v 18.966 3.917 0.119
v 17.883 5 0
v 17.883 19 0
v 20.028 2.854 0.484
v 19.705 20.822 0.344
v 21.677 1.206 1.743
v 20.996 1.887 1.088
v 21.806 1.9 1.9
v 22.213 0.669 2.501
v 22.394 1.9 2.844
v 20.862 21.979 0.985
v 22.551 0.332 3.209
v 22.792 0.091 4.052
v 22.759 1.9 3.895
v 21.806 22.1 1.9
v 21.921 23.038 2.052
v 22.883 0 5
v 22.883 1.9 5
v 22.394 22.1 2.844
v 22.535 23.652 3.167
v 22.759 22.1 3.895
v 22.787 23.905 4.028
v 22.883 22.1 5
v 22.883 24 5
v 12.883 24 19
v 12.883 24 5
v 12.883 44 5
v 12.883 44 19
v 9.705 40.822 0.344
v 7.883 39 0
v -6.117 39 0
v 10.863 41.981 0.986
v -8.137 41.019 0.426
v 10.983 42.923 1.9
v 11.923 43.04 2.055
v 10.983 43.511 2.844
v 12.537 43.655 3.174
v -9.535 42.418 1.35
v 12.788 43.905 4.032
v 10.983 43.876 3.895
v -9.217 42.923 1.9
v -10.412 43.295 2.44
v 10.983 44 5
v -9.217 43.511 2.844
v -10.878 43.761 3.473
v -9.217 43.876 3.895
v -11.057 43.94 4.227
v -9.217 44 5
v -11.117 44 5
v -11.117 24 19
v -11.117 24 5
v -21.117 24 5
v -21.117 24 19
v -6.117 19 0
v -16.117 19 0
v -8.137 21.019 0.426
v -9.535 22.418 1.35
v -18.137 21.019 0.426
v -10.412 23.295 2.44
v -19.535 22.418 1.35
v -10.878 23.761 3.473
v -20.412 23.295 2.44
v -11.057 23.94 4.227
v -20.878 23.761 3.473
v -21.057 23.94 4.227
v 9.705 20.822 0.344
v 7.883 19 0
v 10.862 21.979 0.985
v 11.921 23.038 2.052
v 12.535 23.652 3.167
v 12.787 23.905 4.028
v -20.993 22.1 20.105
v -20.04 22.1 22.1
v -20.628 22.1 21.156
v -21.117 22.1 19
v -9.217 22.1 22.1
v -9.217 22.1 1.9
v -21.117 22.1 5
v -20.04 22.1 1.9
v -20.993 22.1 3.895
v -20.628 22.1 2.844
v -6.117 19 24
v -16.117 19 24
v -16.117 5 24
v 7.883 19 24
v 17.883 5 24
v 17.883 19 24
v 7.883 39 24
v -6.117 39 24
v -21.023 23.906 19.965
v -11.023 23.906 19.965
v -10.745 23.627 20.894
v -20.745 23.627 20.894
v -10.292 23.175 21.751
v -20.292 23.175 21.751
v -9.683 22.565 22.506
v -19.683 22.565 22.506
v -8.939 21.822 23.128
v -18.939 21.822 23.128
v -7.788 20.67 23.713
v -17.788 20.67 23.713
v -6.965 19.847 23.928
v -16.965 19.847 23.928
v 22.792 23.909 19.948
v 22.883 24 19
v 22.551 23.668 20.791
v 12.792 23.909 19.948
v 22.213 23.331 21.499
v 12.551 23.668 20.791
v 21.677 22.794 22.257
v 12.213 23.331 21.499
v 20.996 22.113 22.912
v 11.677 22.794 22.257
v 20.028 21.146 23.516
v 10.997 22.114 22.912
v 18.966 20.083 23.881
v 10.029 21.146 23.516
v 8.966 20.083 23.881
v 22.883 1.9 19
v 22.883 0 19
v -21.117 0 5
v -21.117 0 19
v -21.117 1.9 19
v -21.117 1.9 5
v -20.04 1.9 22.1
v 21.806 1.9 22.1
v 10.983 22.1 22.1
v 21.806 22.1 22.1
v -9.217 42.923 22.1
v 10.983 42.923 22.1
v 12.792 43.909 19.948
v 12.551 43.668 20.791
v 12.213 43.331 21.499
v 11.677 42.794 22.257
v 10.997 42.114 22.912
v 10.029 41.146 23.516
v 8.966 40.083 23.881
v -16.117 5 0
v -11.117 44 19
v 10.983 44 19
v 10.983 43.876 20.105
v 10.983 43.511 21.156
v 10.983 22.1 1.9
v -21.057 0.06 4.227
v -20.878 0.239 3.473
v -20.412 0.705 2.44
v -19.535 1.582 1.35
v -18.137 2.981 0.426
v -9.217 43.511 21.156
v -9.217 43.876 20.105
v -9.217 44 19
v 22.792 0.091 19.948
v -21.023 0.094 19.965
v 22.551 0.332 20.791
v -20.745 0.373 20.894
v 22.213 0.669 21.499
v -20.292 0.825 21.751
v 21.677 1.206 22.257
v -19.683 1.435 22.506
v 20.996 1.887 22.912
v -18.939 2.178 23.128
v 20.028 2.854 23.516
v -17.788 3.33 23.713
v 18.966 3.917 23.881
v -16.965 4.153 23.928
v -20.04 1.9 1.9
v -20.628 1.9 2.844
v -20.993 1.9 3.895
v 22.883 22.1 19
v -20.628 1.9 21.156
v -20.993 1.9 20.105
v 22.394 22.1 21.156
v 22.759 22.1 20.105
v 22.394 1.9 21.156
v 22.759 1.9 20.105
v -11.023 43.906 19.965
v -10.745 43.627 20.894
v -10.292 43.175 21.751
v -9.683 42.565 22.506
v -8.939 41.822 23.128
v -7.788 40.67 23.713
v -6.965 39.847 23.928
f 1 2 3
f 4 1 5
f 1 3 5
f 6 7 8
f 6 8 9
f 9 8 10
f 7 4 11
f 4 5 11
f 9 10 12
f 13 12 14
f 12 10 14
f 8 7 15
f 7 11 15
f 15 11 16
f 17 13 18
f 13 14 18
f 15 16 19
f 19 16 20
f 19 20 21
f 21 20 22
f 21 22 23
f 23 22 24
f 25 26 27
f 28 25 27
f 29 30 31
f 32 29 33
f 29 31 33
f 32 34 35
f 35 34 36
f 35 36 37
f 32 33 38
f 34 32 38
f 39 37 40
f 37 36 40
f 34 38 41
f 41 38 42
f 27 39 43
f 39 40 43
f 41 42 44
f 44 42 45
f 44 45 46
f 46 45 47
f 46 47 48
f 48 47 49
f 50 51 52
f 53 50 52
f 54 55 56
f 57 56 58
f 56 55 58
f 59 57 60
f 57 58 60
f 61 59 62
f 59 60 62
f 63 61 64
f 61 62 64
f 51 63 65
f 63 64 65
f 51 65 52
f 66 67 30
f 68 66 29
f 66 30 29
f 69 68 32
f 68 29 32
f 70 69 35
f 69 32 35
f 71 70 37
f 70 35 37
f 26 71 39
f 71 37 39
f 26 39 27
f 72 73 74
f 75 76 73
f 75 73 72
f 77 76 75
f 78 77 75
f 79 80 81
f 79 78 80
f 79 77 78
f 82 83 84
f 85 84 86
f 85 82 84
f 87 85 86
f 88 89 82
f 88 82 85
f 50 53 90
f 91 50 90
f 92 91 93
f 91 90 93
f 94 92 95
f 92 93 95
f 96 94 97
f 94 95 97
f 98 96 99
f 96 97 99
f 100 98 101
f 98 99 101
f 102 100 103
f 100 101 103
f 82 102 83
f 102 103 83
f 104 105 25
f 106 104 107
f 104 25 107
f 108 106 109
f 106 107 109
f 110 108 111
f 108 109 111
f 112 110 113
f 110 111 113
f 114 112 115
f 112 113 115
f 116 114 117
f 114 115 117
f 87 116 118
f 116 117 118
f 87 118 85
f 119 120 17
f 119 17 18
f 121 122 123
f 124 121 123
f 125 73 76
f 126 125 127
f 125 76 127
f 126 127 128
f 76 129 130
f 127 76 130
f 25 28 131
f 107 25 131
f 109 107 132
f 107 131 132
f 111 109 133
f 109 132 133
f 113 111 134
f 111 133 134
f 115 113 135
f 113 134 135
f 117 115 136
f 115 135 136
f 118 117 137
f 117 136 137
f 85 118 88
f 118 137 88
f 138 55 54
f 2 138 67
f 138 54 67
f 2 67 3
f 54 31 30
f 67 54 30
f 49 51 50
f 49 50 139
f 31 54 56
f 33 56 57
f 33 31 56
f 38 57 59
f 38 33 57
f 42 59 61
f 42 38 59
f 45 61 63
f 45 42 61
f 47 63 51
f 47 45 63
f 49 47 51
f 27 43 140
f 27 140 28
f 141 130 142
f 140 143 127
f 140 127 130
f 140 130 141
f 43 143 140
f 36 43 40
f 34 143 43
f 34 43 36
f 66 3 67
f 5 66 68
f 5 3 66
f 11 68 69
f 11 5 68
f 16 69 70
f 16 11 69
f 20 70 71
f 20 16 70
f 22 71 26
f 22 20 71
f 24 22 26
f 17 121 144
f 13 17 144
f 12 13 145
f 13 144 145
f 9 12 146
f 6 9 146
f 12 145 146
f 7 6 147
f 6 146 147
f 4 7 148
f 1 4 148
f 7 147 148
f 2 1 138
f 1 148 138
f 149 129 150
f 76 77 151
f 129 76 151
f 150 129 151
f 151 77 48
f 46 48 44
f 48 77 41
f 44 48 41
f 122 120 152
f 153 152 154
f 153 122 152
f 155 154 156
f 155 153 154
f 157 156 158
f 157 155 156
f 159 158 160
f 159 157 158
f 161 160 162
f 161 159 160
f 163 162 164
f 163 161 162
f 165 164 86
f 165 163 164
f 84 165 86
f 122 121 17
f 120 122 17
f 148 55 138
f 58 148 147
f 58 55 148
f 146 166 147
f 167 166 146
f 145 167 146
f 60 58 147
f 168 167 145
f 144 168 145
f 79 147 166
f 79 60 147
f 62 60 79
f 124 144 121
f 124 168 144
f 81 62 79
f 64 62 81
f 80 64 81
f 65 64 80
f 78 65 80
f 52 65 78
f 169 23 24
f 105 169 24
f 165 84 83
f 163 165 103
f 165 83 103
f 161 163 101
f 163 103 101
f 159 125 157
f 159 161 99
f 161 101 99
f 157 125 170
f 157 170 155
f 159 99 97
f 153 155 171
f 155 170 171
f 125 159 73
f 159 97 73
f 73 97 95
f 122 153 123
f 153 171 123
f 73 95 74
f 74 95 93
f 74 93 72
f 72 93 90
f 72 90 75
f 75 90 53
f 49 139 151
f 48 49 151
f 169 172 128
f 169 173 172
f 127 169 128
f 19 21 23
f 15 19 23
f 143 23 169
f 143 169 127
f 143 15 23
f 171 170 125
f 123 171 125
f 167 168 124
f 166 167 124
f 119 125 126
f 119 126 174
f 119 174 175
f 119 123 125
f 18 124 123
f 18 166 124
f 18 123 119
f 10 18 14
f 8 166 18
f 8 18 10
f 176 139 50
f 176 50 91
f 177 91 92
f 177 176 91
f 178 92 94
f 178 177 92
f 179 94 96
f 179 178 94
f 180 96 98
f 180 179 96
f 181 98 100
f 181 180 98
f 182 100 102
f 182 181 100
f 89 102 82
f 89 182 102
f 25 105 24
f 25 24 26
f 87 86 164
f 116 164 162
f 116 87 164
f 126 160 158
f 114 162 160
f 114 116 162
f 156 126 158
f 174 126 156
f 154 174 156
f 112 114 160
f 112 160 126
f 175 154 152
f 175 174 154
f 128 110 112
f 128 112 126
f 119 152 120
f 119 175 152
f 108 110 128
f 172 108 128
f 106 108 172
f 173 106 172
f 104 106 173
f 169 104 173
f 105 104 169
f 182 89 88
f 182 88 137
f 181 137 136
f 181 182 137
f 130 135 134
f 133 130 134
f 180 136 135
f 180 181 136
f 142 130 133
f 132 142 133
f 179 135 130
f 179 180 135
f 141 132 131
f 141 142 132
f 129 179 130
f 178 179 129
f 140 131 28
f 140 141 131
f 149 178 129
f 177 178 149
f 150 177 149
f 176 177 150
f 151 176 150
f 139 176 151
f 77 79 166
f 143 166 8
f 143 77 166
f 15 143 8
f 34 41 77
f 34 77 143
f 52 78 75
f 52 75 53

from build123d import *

# Parameters (mm, degrees)
F0_W          = 10
F0_H          = 24
F0_W_2        = 24
F0_H_2        = 20
F1_DEPTH      = 24
F2_T          = -1.9
F3_T1_DEPTH   = 44
F3_T3_DEPTH   = 24
F3_T5_DEPTH   = 10
F3_T7_DEPTH   = 20
F3_T9_DEPTH   = 24
F3_T11_DEPTH  = 10
F3_T17_DEPTH  = 56.5
F3_T21_DEPTH  = 36.5
F3_T28_DEPTH  = 56.5
F3_T32_DEPTH  = 36.5
F3_T39_DEPTH  = 22.5
F3_T43_DEPTH  = 36.5
F3_T50_DEPTH  = 22.5
F3_T54_DEPTH  = 32.5
F3_T61_DEPTH  = 32.5
F3_T65_DEPTH  = 36.5
F3_T72_DEPTH  = 32.5
F3_T76_DEPTH  = 36.5
F3_T83_DEPTH  = 32.5
F3_T87_DEPTH  = 22.5
F3_T94_DEPTH  = 22.5
F3_T98_DEPTH  = 36.5
F3_T105_DEPTH = 56.5
F3_T109_DEPTH = 36.5
F3_T116_DEPTH = 56.5
F3_T120_DEPTH = 36.5
F3_T127_DEPTH = 36.5
F3_T131_DEPTH = 22.5
F3_T138_DEPTH = 22.5
F3_T142_DEPTH = 32.5
F3_T149_DEPTH = 32.5
F3_T153_DEPTH = 36.5
F3_T160_DEPTH = 36.5
F3_T164_DEPTH = 32.5
F3_T171_DEPTH = 32.5
F3_T175_DEPTH = 22.5
F3_T182_DEPTH = 22.5
F3_T186_DEPTH = 36.5


# Not quite as in the source:
# - a fillet or chamfer that OpenCascade refuses, or shapes differently, is made with other operations: its cross-section is extruded or revolved along the edge and cut away or added


with BuildPart() as f1:
    # F0 (on Top) → F1 (new body)
    with BuildSketch(Plane.XY):
        with Locations((-16.1171973497, 12)):
            Rectangle(F0_W, F0_H)
        with Locations((0.8828026503, 12)):
            Rectangle(F0_W_2, F0_H)
        with Locations((17.8828026503, 12)):
            Rectangle(F0_W, F0_H)
        with Locations((0.8828026503, 34)):
            Rectangle(F0_W_2, F0_H_2)
    extrude(amount=F1_DEPTH)

    # F2
    f2_openings = [f1.faces().sort_by_distance(p)[0] for p in [
        (-21.117197, 12, 12),
        (22.882803, 12, 12),
        (0.882803, 44, 12),
    ]]
    offset(amount=F2_T, openings=f2_openings, kind=Kind.INTERSECTION)

    # F3: fillet of radius 5 on 16 edges, made by hand

    # F3_s2 → F3_t1 (cut)
    with BuildSketch(Plane.YZ.offset(-21.1171973497)):
        with BuildLine():
            ThreePointArc((0, 19), (1.4644660941, 22.5355339059), (5, 24))
            Line((5, 24), (5, 24.1))
            Line((5, 24.1), (-0.1, 24.1))
            Line((-0.1, 24.1), (-0.1, 19))
            Line((-0.1, 19), (0, 19))
        make_face()
        with BuildLine():
            ThreePointArc((0, 5), (1.4644660941, 1.4644660941), (5, 0))
            Line((5, 0), (5, -0.1))
            Line((5, -0.1), (-0.1, -0.1))
            Line((-0.1, -0.1), (-0.1, 5))
            Line((-0.1, 5), (0, 5))
        make_face()
    extrude(amount=F3_T1_DEPTH, mode=Mode.SUBTRACT)

    # F3_s4 → F3_t3 (cut)
    with BuildSketch(Plane.XZ.offset(-24)):
        with BuildLine():
            ThreePointArc((17.8828026503, 24), (21.4183365563, 22.5355339059), (22.8828026503, 19))
            Line((22.8828026503, 19), (22.9828026503, 19))
            Line((22.9828026503, 19), (22.9828026503, 24.1))
            Line((22.9828026503, 24.1), (17.8828026503, 24.1))
            Line((17.8828026503, 24.1), (17.8828026503, 24))
        make_face()
        with BuildLine():
            ThreePointArc((-16.1171973497, 24), (-19.6527312556, 22.5355339059), (-21.1171973497, 19))
            Line((-21.1171973497, 19), (-21.2171973497, 19))
            Line((-21.2171973497, 19), (-21.2171973497, 24.1))
            Line((-21.2171973497, 24.1), (-16.1171973497, 24.1))
            Line((-16.1171973497, 24.1), (-16.1171973497, 24))
        make_face()
        with BuildLine():
            ThreePointArc((17.8828026503, 0), (21.4183365563, 1.4644660941), (22.8828026503, 5))
            Line((22.8828026503, 5), (22.9828026503, 5))
            Line((22.9828026503, 5), (22.9828026503, -0.1))
            Line((22.9828026503, -0.1), (17.8828026503, -0.1))
            Line((17.8828026503, -0.1), (17.8828026503, 0))
        make_face()
        with BuildLine():
            ThreePointArc((-16.1171973497, 0), (-19.6527312556, 1.4644660941), (-21.1171973497, 5))
            Line((-21.1171973497, 5), (-21.2171973497, 5))
            Line((-21.2171973497, 5), (-21.2171973497, -0.1))
            Line((-21.2171973497, -0.1), (-16.1171973497, -0.1))
            Line((-16.1171973497, -0.1), (-16.1171973497, 0))
        make_face()
    extrude(amount=F3_T3_DEPTH, mode=Mode.SUBTRACT)

    # F3_s6 → F3_t5 (cut)
    with BuildSketch(Plane.YZ.offset(12.8828026503)):
        with BuildLine():
            ThreePointArc((24, 19), (22.5355339059, 22.5355339059), (19, 24))
            Line((19, 24), (19, 24.1))
            Line((19, 24.1), (24.1, 24.1))
            Line((24.1, 24.1), (24.1, 19))
            Line((24.1, 19), (24, 19))
        make_face()
        with BuildLine():
            ThreePointArc((19, 0), (22.5355339059, 1.4644660941), (24, 5))
            Line((24, 5), (24.1, 5))
            Line((24.1, 5), (24.1, -0.1))
            Line((24.1, -0.1), (19, -0.1))
            Line((19, -0.1), (19, 0))
        make_face()
    extrude(amount=F3_T5_DEPTH, mode=Mode.SUBTRACT)

    # F3_s8 → F3_t7 (cut)
    with BuildSketch(Plane.XZ.offset(-44)):
        with BuildLine():
            ThreePointArc((12.8828026503, 19), (11.4183365563, 22.5355339059), (7.8828026503, 24))
            Line((7.8828026503, 24), (7.8828026503, 24.1))
            Line((7.8828026503, 24.1), (12.9828026503, 24.1))
            Line((12.9828026503, 24.1), (12.9828026503, 19))
            Line((12.9828026503, 19), (12.8828026503, 19))
        make_face()
        with BuildLine():
            ThreePointArc((-11.1171973497, 19), (-9.6527312556, 22.5355339059), (-6.1171973497, 24))
            Line((-6.1171973497, 24), (-6.1171973497, 24.1))
            Line((-6.1171973497, 24.1), (-11.2171973497, 24.1))
            Line((-11.2171973497, 24.1), (-11.2171973497, 19))
            Line((-11.2171973497, 19), (-11.1171973497, 19))
        make_face()
        with BuildLine():
            ThreePointArc((7.8828026503, 0), (11.4183365563, 1.4644660941), (12.8828026503, 5))
            Line((12.8828026503, 5), (12.9828026503, 5))
            Line((12.9828026503, 5), (12.9828026503, -0.1))
            Line((12.9828026503, -0.1), (7.8828026503, -0.1))
            Line((7.8828026503, -0.1), (7.8828026503, 0))
        make_face()
        with BuildLine():
            ThreePointArc((-6.1171973497, 0), (-9.6527312556, 1.4644660941), (-11.1171973497, 5))
            Line((-11.1171973497, 5), (-11.2171973497, 5))
            Line((-11.2171973497, 5), (-11.2171973497, -0.1))
            Line((-11.2171973497, -0.1), (-6.1171973497, -0.1))
            Line((-6.1171973497, -0.1), (-6.1171973497, 0))
        make_face()
    extrude(amount=F3_T7_DEPTH, mode=Mode.SUBTRACT)

    # F3_s10 → F3_t9 (cut)
    with BuildSketch(Plane.YZ.offset(-11.1171973497)):
        with BuildLine():
            ThreePointArc((39, 24), (42.5355339059, 22.5355339059), (44, 19))
            Line((44, 19), (44.1, 19))
            Line((44.1, 19), (44.1, 24.1))
            Line((44.1, 24.1), (39, 24.1))
            Line((39, 24.1), (39, 24))
        make_face()
        with BuildLine():
            ThreePointArc((39, 0), (42.5355339059, 1.4644660941), (44, 5))
            Line((44, 5), (44.1, 5))
            Line((44.1, 5), (44.1, -0.1))
            Line((44.1, -0.1), (39, -0.1))
            Line((39, -0.1), (39, 0))
        make_face()
    extrude(amount=F3_T9_DEPTH, mode=Mode.SUBTRACT)

    # F3_s12 → F3_t11 (cut)
    with BuildSketch(Plane.YZ.offset(-21.1171973497)):
        with BuildLine():
            ThreePointArc((24, 19), (22.5355339059, 22.5355339059), (19, 24))
            Line((19, 24), (19, 24.1))
            Line((19, 24.1), (24.1, 24.1))
            Line((24.1, 24.1), (24.1, 19))
            Line((24.1, 19), (24, 19))
        make_face()
        with BuildLine():
            ThreePointArc((19, 0), (22.5355339059, 1.4644660941), (24, 5))
            Line((24, 5), (24.1, 5))
            Line((24.1, 5), (24.1, -0.1))
            Line((24.1, -0.1), (19, -0.1))
            Line((19, -0.1), (19, 0))
        make_face()
    extrude(amount=F3_T11_DEPTH, mode=Mode.SUBTRACT)


with BuildPart() as f3_tool15:
    # F3_s16 → F3_t17 (new body)
    with BuildSketch(Plane.YZ.offset(-33.6171973497)):
        with BuildLine():
            ThreePointArc((0, 19), (1.4644660941, 22.5355339059), (5, 24))
            Line((5, 24), (5, 24.1))
            Line((5, 24.1), (-0.1, 24.1))
            Line((-0.1, 24.1), (-0.1, 19))
            Line((-0.1, 19), (0, 19))
        make_face()
    extrude(amount=F3_T17_DEPTH)

    split(bisect_by=Plane.YZ.offset(-21.1171973497), keep=Keep.BOTTOM)


with BuildPart() as f3_tool19:
    # F3_s20 → F3_t21 (new body)
    with BuildSketch(Plane.XZ.offset(-24)):
        with BuildLine():
            ThreePointArc((-16.1171973497, 24), (-19.6527312556, 22.5355339059), (-21.1171973497, 19))
            Line((-21.1171973497, 19), (-21.2171973497, 19))
            Line((-21.2171973497, 19), (-21.2171973497, 24.1))
            Line((-21.2171973497, 24.1), (-16.1171973497, 24.1))
            Line((-16.1171973497, 24.1), (-16.1171973497, 24))
        make_face()
    extrude(amount=F3_T21_DEPTH)

    split(bisect_by=Plane.XZ, keep=Keep.TOP)


with BuildPart() as f3_tool15_1:
    add(f3_tool15.part)

    # F3_t23: intersect F3_tool19
    add(f3_tool19.part, mode=Mode.INTERSECT)


with BuildPart() as f1_1:
    add(f1.part)

    # F3_t13: cut F3_tool15
    add(f3_tool15_1.part, mode=Mode.SUBTRACT)


with BuildPart() as f3_tool26:
    # F3_s27 → F3_t28 (new body)
    with BuildSketch(Plane.YZ.offset(-21.1171973497)):
        with BuildLine():
            ThreePointArc((0, 19), (1.4644660941, 22.5355339059), (5, 24))
            Line((5, 24), (5, 24.1))
            Line((5, 24.1), (-0.1, 24.1))
            Line((-0.1, 24.1), (-0.1, 19))
            Line((-0.1, 19), (0, 19))
        make_face()
    extrude(amount=F3_T28_DEPTH)

    split(bisect_by=Plane.YZ.offset(22.8828026503), keep=Keep.TOP)


with BuildPart() as f3_tool30:
    # F3_s31 → F3_t32 (new body)
    with BuildSketch(Plane.XZ.offset(12.5)):
        with BuildLine():
            ThreePointArc((17.8828026503, 24), (21.4183365563, 22.5355339059), (22.8828026503, 19))
            Line((22.8828026503, 19), (22.9828026503, 19))
            Line((22.9828026503, 19), (22.9828026503, 24.1))
            Line((22.9828026503, 24.1), (17.8828026503, 24.1))
            Line((17.8828026503, 24.1), (17.8828026503, 24))
        make_face()
    extrude(amount=-F3_T32_DEPTH)

    split(bisect_by=Plane.XZ, keep=Keep.TOP)


with BuildPart() as f3_tool26_1:
    add(f3_tool26.part)

    # F3_t34: intersect F3_tool30
    add(f3_tool30.part, mode=Mode.INTERSECT)


with BuildPart() as f1_2:
    add(f1_1.part)

    # F3_t24: cut F3_tool26
    add(f3_tool26_1.part, mode=Mode.SUBTRACT)


with BuildPart() as f3_tool37:
    # F3_s38 → F3_t39 (new body)
    with BuildSketch(Plane.YZ.offset(35.3828026503)):
        with BuildLine():
            ThreePointArc((24, 19), (22.5355339059, 22.5355339059), (19, 24))
            Line((19, 24), (19, 24.1))
            Line((19, 24.1), (24.1, 24.1))
            Line((24.1, 24.1), (24.1, 19))
            Line((24.1, 19), (24, 19))
        make_face()
    extrude(amount=-F3_T39_DEPTH)

    split(bisect_by=Plane.YZ.offset(22.8828026503), keep=Keep.TOP)


with BuildPart() as f3_tool41:
    # F3_s42 → F3_t43 (new body)
    with BuildSketch(Plane.XZ):
        with BuildLine():
            ThreePointArc((17.8828026503, 24), (21.4183365563, 22.5355339059), (22.8828026503, 19))
            Line((22.8828026503, 19), (22.9828026503, 19))
            Line((22.9828026503, 19), (22.9828026503, 24.1))
            Line((22.9828026503, 24.1), (17.8828026503, 24.1))
            Line((17.8828026503, 24.1), (17.8828026503, 24))
        make_face()
    extrude(amount=-F3_T43_DEPTH)

    split(bisect_by=Plane.XZ.offset(-24), keep=Keep.BOTTOM)


with BuildPart() as f3_tool37_1:
    add(f3_tool37.part)

    # F3_t45: intersect F3_tool41
    add(f3_tool41.part, mode=Mode.INTERSECT)


with BuildPart() as f1_3:
    add(f1_2.part)

    # F3_t35: cut F3_tool37
    add(f3_tool37_1.part, mode=Mode.SUBTRACT)


with BuildPart() as f3_tool48:
    # F3_s49 → F3_t50 (new body)
    with BuildSketch(Plane.YZ.offset(22.8828026503)):
        with BuildLine():
            ThreePointArc((24, 19), (22.5355339059, 22.5355339059), (19, 24))
            Line((19, 24), (19, 24.1))
            Line((19, 24.1), (24.1, 24.1))
            Line((24.1, 24.1), (24.1, 19))
            Line((24.1, 19), (24, 19))
        make_face()
    extrude(amount=-F3_T50_DEPTH)

    split(bisect_by=Plane.YZ.offset(12.8828026503), keep=Keep.BOTTOM)


with BuildPart() as f3_tool52:
    # F3_s53 → F3_t54 (new body)
    with BuildSketch(Plane.XZ.offset(-11.5)):
        with BuildLine():
            ThreePointArc((12.8828026503, 19), (11.4183365563, 22.5355339059), (7.8828026503, 24))
            Line((7.8828026503, 24), (7.8828026503, 24.1))
            Line((7.8828026503, 24.1), (12.9828026503, 24.1))
            Line((12.9828026503, 24.1), (12.9828026503, 19))
            Line((12.9828026503, 19), (12.8828026503, 19))
        make_face()
    extrude(amount=-F3_T54_DEPTH)

    split(bisect_by=Plane.XZ.offset(-24), keep=Keep.TOP)


with BuildPart() as f3_tool48_1:
    add(f3_tool48.part)

    # F3_t56: intersect F3_tool52
    add(f3_tool52.part, mode=Mode.INTERSECT)


with BuildPart() as f1_4:
    add(f1_3.part)

    # F3_t46: cut F3_tool48
    add(f3_tool48_1.part, mode=Mode.SUBTRACT)


with BuildPart() as f3_tool59:
    # F3_s60 → F3_t61 (new body)
    with BuildSketch(Plane.XZ.offset(-24)):
        with BuildLine():
            ThreePointArc((12.8828026503, 19), (11.4183365563, 22.5355339059), (7.8828026503, 24))
            Line((7.8828026503, 24), (7.8828026503, 24.1))
            Line((7.8828026503, 24.1), (12.9828026503, 24.1))
            Line((12.9828026503, 24.1), (12.9828026503, 19))
            Line((12.9828026503, 19), (12.8828026503, 19))
        make_face()
    extrude(amount=-F3_T61_DEPTH)

    split(bisect_by=Plane.XZ.offset(-44), keep=Keep.BOTTOM)


with BuildPart() as f3_tool63:
    # F3_s64 → F3_t65 (new body)
    with BuildSketch(Plane.YZ.offset(25.3828026503)):
        with BuildLine():
            ThreePointArc((39, 24), (42.5355339059, 22.5355339059), (44, 19))
            Line((44, 19), (44.1, 19))
            Line((44.1, 19), (44.1, 24.1))
            Line((44.1, 24.1), (39, 24.1))
            Line((39, 24.1), (39, 24))
        make_face()
    extrude(amount=-F3_T65_DEPTH)

    split(bisect_by=Plane.YZ.offset(12.8828026503), keep=Keep.TOP)


with BuildPart() as f3_tool59_1:
    add(f3_tool59.part)

    # F3_t67: intersect F3_tool63
    add(f3_tool63.part, mode=Mode.INTERSECT)


with BuildPart() as f1_5:
    add(f1_4.part)

    # F3_t57: cut F3_tool59
    add(f3_tool59_1.part, mode=Mode.SUBTRACT)


with BuildPart() as f3_tool70:
    # F3_s71 → F3_t72 (new body)
    with BuildSketch(Plane.XZ.offset(-56.5)):
        with BuildLine():
            ThreePointArc((-11.1171973497, 19), (-9.6527312556, 22.5355339059), (-6.1171973497, 24))
            Line((-6.1171973497, 24), (-6.1171973497, 24.1))
            Line((-6.1171973497, 24.1), (-11.2171973497, 24.1))
            Line((-11.2171973497, 24.1), (-11.2171973497, 19))
            Line((-11.2171973497, 19), (-11.1171973497, 19))
        make_face()
    extrude(amount=F3_T72_DEPTH)

    split(bisect_by=Plane.XZ.offset(-44), keep=Keep.BOTTOM)


with BuildPart() as f3_tool74:
    # F3_s75 → F3_t76 (new body)
    with BuildSketch(Plane.YZ.offset(12.8828026503)):
        with BuildLine():
            ThreePointArc((39, 24), (42.5355339059, 22.5355339059), (44, 19))
            Line((44, 19), (44.1, 19))
            Line((44.1, 19), (44.1, 24.1))
            Line((44.1, 24.1), (39, 24.1))
            Line((39, 24.1), (39, 24))
        make_face()
    extrude(amount=-F3_T76_DEPTH)

    split(bisect_by=Plane.YZ.offset(-11.1171973497), keep=Keep.BOTTOM)


with BuildPart() as f3_tool70_1:
    add(f3_tool70.part)

    # F3_t78: intersect F3_tool74
    add(f3_tool74.part, mode=Mode.INTERSECT)


with BuildPart() as f1_6:
    add(f1_5.part)

    # F3_t68: cut F3_tool70
    add(f3_tool70_1.part, mode=Mode.SUBTRACT)


with BuildPart() as f3_tool81:
    # F3_s82 → F3_t83 (new body)
    with BuildSketch(Plane.XZ.offset(-44)):
        with BuildLine():
            ThreePointArc((-11.1171973497, 19), (-9.6527312556, 22.5355339059), (-6.1171973497, 24))
            Line((-6.1171973497, 24), (-6.1171973497, 24.1))
            Line((-6.1171973497, 24.1), (-11.2171973497, 24.1))
            Line((-11.2171973497, 24.1), (-11.2171973497, 19))
            Line((-11.2171973497, 19), (-11.1171973497, 19))
        make_face()
    extrude(amount=F3_T83_DEPTH)

    split(bisect_by=Plane.XZ.offset(-24), keep=Keep.TOP)


with BuildPart() as f3_tool85:
    # F3_s86 → F3_t87 (new body)
    with BuildSketch(Plane.YZ.offset(1.3828026503)):
        with BuildLine():
            ThreePointArc((24, 19), (22.5355339059, 22.5355339059), (19, 24))
            Line((19, 24), (19, 24.1))
            Line((19, 24.1), (24.1, 24.1))
            Line((24.1, 24.1), (24.1, 19))
            Line((24.1, 19), (24, 19))
        make_face()
    extrude(amount=-F3_T87_DEPTH)

    split(bisect_by=Plane.YZ.offset(-11.1171973497), keep=Keep.TOP)


with BuildPart() as f3_tool81_1:
    add(f3_tool81.part)

    # F3_t89: intersect F3_tool85
    add(f3_tool85.part, mode=Mode.INTERSECT)


with BuildPart() as f1_7:
    add(f1_6.part)

    # F3_t79: cut F3_tool81
    add(f3_tool81_1.part, mode=Mode.SUBTRACT)


with BuildPart() as f3_tool92:
    # F3_s93 → F3_t94 (new body)
    with BuildSketch(Plane.YZ.offset(-11.1171973497)):
        with BuildLine():
            ThreePointArc((24, 19), (22.5355339059, 22.5355339059), (19, 24))
            Line((19, 24), (19, 24.1))
            Line((19, 24.1), (24.1, 24.1))
            Line((24.1, 24.1), (24.1, 19))
            Line((24.1, 19), (24, 19))
        make_face()
    extrude(amount=-F3_T94_DEPTH)

    split(bisect_by=Plane.YZ.offset(-21.1171973497), keep=Keep.BOTTOM)


with BuildPart() as f3_tool96:
    # F3_s97 → F3_t98 (new body)
    with BuildSketch(Plane.XZ.offset(-36.5)):
        with BuildLine():
            ThreePointArc((-16.1171973497, 24), (-19.6527312556, 22.5355339059), (-21.1171973497, 19))
            Line((-21.1171973497, 19), (-21.2171973497, 19))
            Line((-21.2171973497, 19), (-21.2171973497, 24.1))
            Line((-21.2171973497, 24.1), (-16.1171973497, 24.1))
            Line((-16.1171973497, 24.1), (-16.1171973497, 24))
        make_face()
    extrude(amount=F3_T98_DEPTH)

    split(bisect_by=Plane.XZ.offset(-24), keep=Keep.BOTTOM)


with BuildPart() as f3_tool92_1:
    add(f3_tool92.part)

    # F3_t100: intersect F3_tool96
    add(f3_tool96.part, mode=Mode.INTERSECT)


with BuildPart() as f1_8:
    add(f1_7.part)

    # F3_t90: cut F3_tool92
    add(f3_tool92_1.part, mode=Mode.SUBTRACT)


with BuildPart() as f3_tool103:
    # F3_s104 → F3_t105 (new body)
    with BuildSketch(Plane.YZ.offset(-33.6171973497)):
        with BuildLine():
            ThreePointArc((0, 5), (1.4644660941, 1.4644660941), (5, 0))
            Line((5, 0), (5, -0.1))
            Line((5, -0.1), (-0.1, -0.1))
            Line((-0.1, -0.1), (-0.1, 5))
            Line((-0.1, 5), (0, 5))
        make_face()
    extrude(amount=F3_T105_DEPTH)

    split(bisect_by=Plane.YZ.offset(-21.1171973497), keep=Keep.BOTTOM)


with BuildPart() as f3_tool107:
    # F3_s108 → F3_t109 (new body)
    with BuildSketch(Plane.XZ.offset(-24)):
        with BuildLine():
            ThreePointArc((-16.1171973497, 0), (-19.6527312556, 1.4644660941), (-21.1171973497, 5))
            Line((-21.1171973497, 5), (-21.2171973497, 5))
            Line((-21.2171973497, 5), (-21.2171973497, -0.1))
            Line((-21.2171973497, -0.1), (-16.1171973497, -0.1))
            Line((-16.1171973497, -0.1), (-16.1171973497, 0))
        make_face()
    extrude(amount=F3_T109_DEPTH)

    split(bisect_by=Plane.XZ, keep=Keep.TOP)


with BuildPart() as f3_tool103_1:
    add(f3_tool103.part)

    # F3_t111: intersect F3_tool107
    add(f3_tool107.part, mode=Mode.INTERSECT)


with BuildPart() as f1_9:
    add(f1_8.part)

    # F3_t101: cut F3_tool103
    add(f3_tool103_1.part, mode=Mode.SUBTRACT)


with BuildPart() as f3_tool114:
    # F3_s115 → F3_t116 (new body)
    with BuildSketch(Plane.YZ.offset(-21.1171973497)):
        with BuildLine():
            ThreePointArc((0, 5), (1.4644660941, 1.4644660941), (5, 0))
            Line((5, 0), (5, -0.1))
            Line((5, -0.1), (-0.1, -0.1))
            Line((-0.1, -0.1), (-0.1, 5))
            Line((-0.1, 5), (0, 5))
        make_face()
    extrude(amount=F3_T116_DEPTH)

    split(bisect_by=Plane.YZ.offset(22.8828026503), keep=Keep.TOP)


with BuildPart() as f3_tool118:
    # F3_s119 → F3_t120 (new body)
    with BuildSketch(Plane.XZ.offset(12.5)):
        with BuildLine():
            ThreePointArc((17.8828026503, 0), (21.4183365563, 1.4644660941), (22.8828026503, 5))
            Line((22.8828026503, 5), (22.9828026503, 5))
            Line((22.9828026503, 5), (22.9828026503, -0.1))
            Line((22.9828026503, -0.1), (17.8828026503, -0.1))
            Line((17.8828026503, -0.1), (17.8828026503, 0))
        make_face()
    extrude(amount=-F3_T120_DEPTH)

    split(bisect_by=Plane.XZ, keep=Keep.TOP)


with BuildPart() as f3_tool114_1:
    add(f3_tool114.part)

    # F3_t122: intersect F3_tool118
    add(f3_tool118.part, mode=Mode.INTERSECT)


with BuildPart() as f1_10:
    add(f1_9.part)

    # F3_t112: cut F3_tool114
    add(f3_tool114_1.part, mode=Mode.SUBTRACT)


with BuildPart() as f3_tool125:
    # F3_s126 → F3_t127 (new body)
    with BuildSketch(Plane.XZ):
        with BuildLine():
            ThreePointArc((17.8828026503, 0), (21.4183365563, 1.4644660941), (22.8828026503, 5))
            Line((22.8828026503, 5), (22.9828026503, 5))
            Line((22.9828026503, 5), (22.9828026503, -0.1))
            Line((22.9828026503, -0.1), (17.8828026503, -0.1))
            Line((17.8828026503, -0.1), (17.8828026503, 0))
        make_face()
    extrude(amount=-F3_T127_DEPTH)

    split(bisect_by=Plane.XZ.offset(-24), keep=Keep.BOTTOM)


with BuildPart() as f3_tool129:
    # F3_s130 → F3_t131 (new body)
    with BuildSketch(Plane.YZ.offset(35.3828026503)):
        with BuildLine():
            ThreePointArc((19, 0), (22.5355339059, 1.4644660941), (24, 5))
            Line((24, 5), (24.1, 5))
            Line((24.1, 5), (24.1, -0.1))
            Line((24.1, -0.1), (19, -0.1))
            Line((19, -0.1), (19, 0))
        make_face()
    extrude(amount=-F3_T131_DEPTH)

    split(bisect_by=Plane.YZ.offset(22.8828026503), keep=Keep.TOP)


with BuildPart() as f3_tool125_1:
    add(f3_tool125.part)

    # F3_t133: intersect F3_tool129
    add(f3_tool129.part, mode=Mode.INTERSECT)


with BuildPart() as f1_11:
    add(f1_10.part)

    # F3_t123: cut F3_tool125
    add(f3_tool125_1.part, mode=Mode.SUBTRACT)


with BuildPart() as f3_tool136:
    # F3_s137 → F3_t138 (new body)
    with BuildSketch(Plane.YZ.offset(22.8828026503)):
        with BuildLine():
            ThreePointArc((19, 0), (22.5355339059, 1.4644660941), (24, 5))
            Line((24, 5), (24.1, 5))
            Line((24.1, 5), (24.1, -0.1))
            Line((24.1, -0.1), (19, -0.1))
            Line((19, -0.1), (19, 0))
        make_face()
    extrude(amount=-F3_T138_DEPTH)

    split(bisect_by=Plane.YZ.offset(12.8828026503), keep=Keep.BOTTOM)


with BuildPart() as f3_tool140:
    # F3_s141 → F3_t142 (new body)
    with BuildSketch(Plane.XZ.offset(-11.5)):
        with BuildLine():
            ThreePointArc((7.8828026503, 0), (11.4183365563, 1.4644660941), (12.8828026503, 5))
            Line((12.8828026503, 5), (12.9828026503, 5))
            Line((12.9828026503, 5), (12.9828026503, -0.1))
            Line((12.9828026503, -0.1), (7.8828026503, -0.1))
            Line((7.8828026503, -0.1), (7.8828026503, 0))
        make_face()
    extrude(amount=-F3_T142_DEPTH)

    split(bisect_by=Plane.XZ.offset(-24), keep=Keep.TOP)


with BuildPart() as f3_tool136_1:
    add(f3_tool136.part)

    # F3_t144: intersect F3_tool140
    add(f3_tool140.part, mode=Mode.INTERSECT)


with BuildPart() as f1_12:
    add(f1_11.part)

    # F3_t134: cut F3_tool136
    add(f3_tool136_1.part, mode=Mode.SUBTRACT)


with BuildPart() as f3_tool147:
    # F3_s148 → F3_t149 (new body)
    with BuildSketch(Plane.XZ.offset(-24)):
        with BuildLine():
            ThreePointArc((7.8828026503, 0), (11.4183365563, 1.4644660941), (12.8828026503, 5))
            Line((12.8828026503, 5), (12.9828026503, 5))
            Line((12.9828026503, 5), (12.9828026503, -0.1))
            Line((12.9828026503, -0.1), (7.8828026503, -0.1))
            Line((7.8828026503, -0.1), (7.8828026503, 0))
        make_face()
    extrude(amount=-F3_T149_DEPTH)

    split(bisect_by=Plane.XZ.offset(-44), keep=Keep.BOTTOM)


with BuildPart() as f3_tool151:
    # F3_s152 → F3_t153 (new body)
    with BuildSketch(Plane.YZ.offset(25.3828026503)):
        with BuildLine():
            ThreePointArc((39, 0), (42.5355339059, 1.4644660941), (44, 5))
            Line((44, 5), (44.1, 5))
            Line((44.1, 5), (44.1, -0.1))
            Line((44.1, -0.1), (39, -0.1))
            Line((39, -0.1), (39, 0))
        make_face()
    extrude(amount=-F3_T153_DEPTH)

    split(bisect_by=Plane.YZ.offset(12.8828026503), keep=Keep.TOP)


with BuildPart() as f3_tool147_1:
    add(f3_tool147.part)

    # F3_t155: intersect F3_tool151
    add(f3_tool151.part, mode=Mode.INTERSECT)


with BuildPart() as f1_13:
    add(f1_12.part)

    # F3_t145: cut F3_tool147
    add(f3_tool147_1.part, mode=Mode.SUBTRACT)


with BuildPart() as f3_tool158:
    # F3_s159 → F3_t160 (new body)
    with BuildSketch(Plane.YZ.offset(12.8828026503)):
        with BuildLine():
            ThreePointArc((39, 0), (42.5355339059, 1.4644660941), (44, 5))
            Line((44, 5), (44.1, 5))
            Line((44.1, 5), (44.1, -0.1))
            Line((44.1, -0.1), (39, -0.1))
            Line((39, -0.1), (39, 0))
        make_face()
    extrude(amount=-F3_T160_DEPTH)

    split(bisect_by=Plane.YZ.offset(-11.1171973497), keep=Keep.BOTTOM)


with BuildPart() as f3_tool162:
    # F3_s163 → F3_t164 (new body)
    with BuildSketch(Plane.XZ.offset(-56.5)):
        with BuildLine():
            ThreePointArc((-6.1171973497, 0), (-9.6527312556, 1.4644660941), (-11.1171973497, 5))
            Line((-11.1171973497, 5), (-11.2171973497, 5))
            Line((-11.2171973497, 5), (-11.2171973497, -0.1))
            Line((-11.2171973497, -0.1), (-6.1171973497, -0.1))
            Line((-6.1171973497, -0.1), (-6.1171973497, 0))
        make_face()
    extrude(amount=F3_T164_DEPTH)

    split(bisect_by=Plane.XZ.offset(-44), keep=Keep.BOTTOM)


with BuildPart() as f3_tool158_1:
    add(f3_tool158.part)

    # F3_t166: intersect F3_tool162
    add(f3_tool162.part, mode=Mode.INTERSECT)


with BuildPart() as f1_14:
    add(f1_13.part)

    # F3_t156: cut F3_tool158
    add(f3_tool158_1.part, mode=Mode.SUBTRACT)


with BuildPart() as f3_tool169:
    # F3_s170 → F3_t171 (new body)
    with BuildSketch(Plane.XZ.offset(-44)):
        with BuildLine():
            ThreePointArc((-6.1171973497, 0), (-9.6527312556, 1.4644660941), (-11.1171973497, 5))
            Line((-11.1171973497, 5), (-11.2171973497, 5))
            Line((-11.2171973497, 5), (-11.2171973497, -0.1))
            Line((-11.2171973497, -0.1), (-6.1171973497, -0.1))
            Line((-6.1171973497, -0.1), (-6.1171973497, 0))
        make_face()
    extrude(amount=F3_T171_DEPTH)

    split(bisect_by=Plane.XZ.offset(-24), keep=Keep.TOP)


with BuildPart() as f3_tool173:
    # F3_s174 → F3_t175 (new body)
    with BuildSketch(Plane.YZ.offset(1.3828026503)):
        with BuildLine():
            ThreePointArc((19, 0), (22.5355339059, 1.4644660941), (24, 5))
            Line((24, 5), (24.1, 5))
            Line((24.1, 5), (24.1, -0.1))
            Line((24.1, -0.1), (19, -0.1))
            Line((19, -0.1), (19, 0))
        make_face()
    extrude(amount=-F3_T175_DEPTH)

    split(bisect_by=Plane.YZ.offset(-11.1171973497), keep=Keep.TOP)


with BuildPart() as f3_tool169_1:
    add(f3_tool169.part)

    # F3_t177: intersect F3_tool173
    add(f3_tool173.part, mode=Mode.INTERSECT)


with BuildPart() as f1_15:
    add(f1_14.part)

    # F3_t167: cut F3_tool169
    add(f3_tool169_1.part, mode=Mode.SUBTRACT)


with BuildPart() as f3_tool180:
    # F3_s181 → F3_t182 (new body)
    with BuildSketch(Plane.YZ.offset(-11.1171973497)):
        with BuildLine():
            ThreePointArc((19, 0), (22.5355339059, 1.4644660941), (24, 5))
            Line((24, 5), (24.1, 5))
            Line((24.1, 5), (24.1, -0.1))
            Line((24.1, -0.1), (19, -0.1))
            Line((19, -0.1), (19, 0))
        make_face()
    extrude(amount=-F3_T182_DEPTH)

    split(bisect_by=Plane.YZ.offset(-21.1171973497), keep=Keep.BOTTOM)


with BuildPart() as f3_tool184:
    # F3_s185 → F3_t186 (new body)
    with BuildSketch(Plane.XZ.offset(-36.5)):
        with BuildLine():
            ThreePointArc((-16.1171973497, 0), (-19.6527312556, 1.4644660941), (-21.1171973497, 5))
            Line((-21.1171973497, 5), (-21.2171973497, 5))
            Line((-21.2171973497, 5), (-21.2171973497, -0.1))
            Line((-21.2171973497, -0.1), (-16.1171973497, -0.1))
            Line((-16.1171973497, -0.1), (-16.1171973497, 0))
        make_face()
    extrude(amount=F3_T186_DEPTH)

    split(bisect_by=Plane.XZ.offset(-24), keep=Keep.BOTTOM)


with BuildPart() as f3_tool180_1:
    add(f3_tool180.part)

    # F3_t188: intersect F3_tool184
    add(f3_tool184.part, mode=Mode.INTERSECT)


with BuildPart() as f1_16:
    add(f1_15.part)

    # F3_t178: cut F3_tool180
    add(f3_tool180_1.part, mode=Mode.SUBTRACT)


solid = f1_16.part
